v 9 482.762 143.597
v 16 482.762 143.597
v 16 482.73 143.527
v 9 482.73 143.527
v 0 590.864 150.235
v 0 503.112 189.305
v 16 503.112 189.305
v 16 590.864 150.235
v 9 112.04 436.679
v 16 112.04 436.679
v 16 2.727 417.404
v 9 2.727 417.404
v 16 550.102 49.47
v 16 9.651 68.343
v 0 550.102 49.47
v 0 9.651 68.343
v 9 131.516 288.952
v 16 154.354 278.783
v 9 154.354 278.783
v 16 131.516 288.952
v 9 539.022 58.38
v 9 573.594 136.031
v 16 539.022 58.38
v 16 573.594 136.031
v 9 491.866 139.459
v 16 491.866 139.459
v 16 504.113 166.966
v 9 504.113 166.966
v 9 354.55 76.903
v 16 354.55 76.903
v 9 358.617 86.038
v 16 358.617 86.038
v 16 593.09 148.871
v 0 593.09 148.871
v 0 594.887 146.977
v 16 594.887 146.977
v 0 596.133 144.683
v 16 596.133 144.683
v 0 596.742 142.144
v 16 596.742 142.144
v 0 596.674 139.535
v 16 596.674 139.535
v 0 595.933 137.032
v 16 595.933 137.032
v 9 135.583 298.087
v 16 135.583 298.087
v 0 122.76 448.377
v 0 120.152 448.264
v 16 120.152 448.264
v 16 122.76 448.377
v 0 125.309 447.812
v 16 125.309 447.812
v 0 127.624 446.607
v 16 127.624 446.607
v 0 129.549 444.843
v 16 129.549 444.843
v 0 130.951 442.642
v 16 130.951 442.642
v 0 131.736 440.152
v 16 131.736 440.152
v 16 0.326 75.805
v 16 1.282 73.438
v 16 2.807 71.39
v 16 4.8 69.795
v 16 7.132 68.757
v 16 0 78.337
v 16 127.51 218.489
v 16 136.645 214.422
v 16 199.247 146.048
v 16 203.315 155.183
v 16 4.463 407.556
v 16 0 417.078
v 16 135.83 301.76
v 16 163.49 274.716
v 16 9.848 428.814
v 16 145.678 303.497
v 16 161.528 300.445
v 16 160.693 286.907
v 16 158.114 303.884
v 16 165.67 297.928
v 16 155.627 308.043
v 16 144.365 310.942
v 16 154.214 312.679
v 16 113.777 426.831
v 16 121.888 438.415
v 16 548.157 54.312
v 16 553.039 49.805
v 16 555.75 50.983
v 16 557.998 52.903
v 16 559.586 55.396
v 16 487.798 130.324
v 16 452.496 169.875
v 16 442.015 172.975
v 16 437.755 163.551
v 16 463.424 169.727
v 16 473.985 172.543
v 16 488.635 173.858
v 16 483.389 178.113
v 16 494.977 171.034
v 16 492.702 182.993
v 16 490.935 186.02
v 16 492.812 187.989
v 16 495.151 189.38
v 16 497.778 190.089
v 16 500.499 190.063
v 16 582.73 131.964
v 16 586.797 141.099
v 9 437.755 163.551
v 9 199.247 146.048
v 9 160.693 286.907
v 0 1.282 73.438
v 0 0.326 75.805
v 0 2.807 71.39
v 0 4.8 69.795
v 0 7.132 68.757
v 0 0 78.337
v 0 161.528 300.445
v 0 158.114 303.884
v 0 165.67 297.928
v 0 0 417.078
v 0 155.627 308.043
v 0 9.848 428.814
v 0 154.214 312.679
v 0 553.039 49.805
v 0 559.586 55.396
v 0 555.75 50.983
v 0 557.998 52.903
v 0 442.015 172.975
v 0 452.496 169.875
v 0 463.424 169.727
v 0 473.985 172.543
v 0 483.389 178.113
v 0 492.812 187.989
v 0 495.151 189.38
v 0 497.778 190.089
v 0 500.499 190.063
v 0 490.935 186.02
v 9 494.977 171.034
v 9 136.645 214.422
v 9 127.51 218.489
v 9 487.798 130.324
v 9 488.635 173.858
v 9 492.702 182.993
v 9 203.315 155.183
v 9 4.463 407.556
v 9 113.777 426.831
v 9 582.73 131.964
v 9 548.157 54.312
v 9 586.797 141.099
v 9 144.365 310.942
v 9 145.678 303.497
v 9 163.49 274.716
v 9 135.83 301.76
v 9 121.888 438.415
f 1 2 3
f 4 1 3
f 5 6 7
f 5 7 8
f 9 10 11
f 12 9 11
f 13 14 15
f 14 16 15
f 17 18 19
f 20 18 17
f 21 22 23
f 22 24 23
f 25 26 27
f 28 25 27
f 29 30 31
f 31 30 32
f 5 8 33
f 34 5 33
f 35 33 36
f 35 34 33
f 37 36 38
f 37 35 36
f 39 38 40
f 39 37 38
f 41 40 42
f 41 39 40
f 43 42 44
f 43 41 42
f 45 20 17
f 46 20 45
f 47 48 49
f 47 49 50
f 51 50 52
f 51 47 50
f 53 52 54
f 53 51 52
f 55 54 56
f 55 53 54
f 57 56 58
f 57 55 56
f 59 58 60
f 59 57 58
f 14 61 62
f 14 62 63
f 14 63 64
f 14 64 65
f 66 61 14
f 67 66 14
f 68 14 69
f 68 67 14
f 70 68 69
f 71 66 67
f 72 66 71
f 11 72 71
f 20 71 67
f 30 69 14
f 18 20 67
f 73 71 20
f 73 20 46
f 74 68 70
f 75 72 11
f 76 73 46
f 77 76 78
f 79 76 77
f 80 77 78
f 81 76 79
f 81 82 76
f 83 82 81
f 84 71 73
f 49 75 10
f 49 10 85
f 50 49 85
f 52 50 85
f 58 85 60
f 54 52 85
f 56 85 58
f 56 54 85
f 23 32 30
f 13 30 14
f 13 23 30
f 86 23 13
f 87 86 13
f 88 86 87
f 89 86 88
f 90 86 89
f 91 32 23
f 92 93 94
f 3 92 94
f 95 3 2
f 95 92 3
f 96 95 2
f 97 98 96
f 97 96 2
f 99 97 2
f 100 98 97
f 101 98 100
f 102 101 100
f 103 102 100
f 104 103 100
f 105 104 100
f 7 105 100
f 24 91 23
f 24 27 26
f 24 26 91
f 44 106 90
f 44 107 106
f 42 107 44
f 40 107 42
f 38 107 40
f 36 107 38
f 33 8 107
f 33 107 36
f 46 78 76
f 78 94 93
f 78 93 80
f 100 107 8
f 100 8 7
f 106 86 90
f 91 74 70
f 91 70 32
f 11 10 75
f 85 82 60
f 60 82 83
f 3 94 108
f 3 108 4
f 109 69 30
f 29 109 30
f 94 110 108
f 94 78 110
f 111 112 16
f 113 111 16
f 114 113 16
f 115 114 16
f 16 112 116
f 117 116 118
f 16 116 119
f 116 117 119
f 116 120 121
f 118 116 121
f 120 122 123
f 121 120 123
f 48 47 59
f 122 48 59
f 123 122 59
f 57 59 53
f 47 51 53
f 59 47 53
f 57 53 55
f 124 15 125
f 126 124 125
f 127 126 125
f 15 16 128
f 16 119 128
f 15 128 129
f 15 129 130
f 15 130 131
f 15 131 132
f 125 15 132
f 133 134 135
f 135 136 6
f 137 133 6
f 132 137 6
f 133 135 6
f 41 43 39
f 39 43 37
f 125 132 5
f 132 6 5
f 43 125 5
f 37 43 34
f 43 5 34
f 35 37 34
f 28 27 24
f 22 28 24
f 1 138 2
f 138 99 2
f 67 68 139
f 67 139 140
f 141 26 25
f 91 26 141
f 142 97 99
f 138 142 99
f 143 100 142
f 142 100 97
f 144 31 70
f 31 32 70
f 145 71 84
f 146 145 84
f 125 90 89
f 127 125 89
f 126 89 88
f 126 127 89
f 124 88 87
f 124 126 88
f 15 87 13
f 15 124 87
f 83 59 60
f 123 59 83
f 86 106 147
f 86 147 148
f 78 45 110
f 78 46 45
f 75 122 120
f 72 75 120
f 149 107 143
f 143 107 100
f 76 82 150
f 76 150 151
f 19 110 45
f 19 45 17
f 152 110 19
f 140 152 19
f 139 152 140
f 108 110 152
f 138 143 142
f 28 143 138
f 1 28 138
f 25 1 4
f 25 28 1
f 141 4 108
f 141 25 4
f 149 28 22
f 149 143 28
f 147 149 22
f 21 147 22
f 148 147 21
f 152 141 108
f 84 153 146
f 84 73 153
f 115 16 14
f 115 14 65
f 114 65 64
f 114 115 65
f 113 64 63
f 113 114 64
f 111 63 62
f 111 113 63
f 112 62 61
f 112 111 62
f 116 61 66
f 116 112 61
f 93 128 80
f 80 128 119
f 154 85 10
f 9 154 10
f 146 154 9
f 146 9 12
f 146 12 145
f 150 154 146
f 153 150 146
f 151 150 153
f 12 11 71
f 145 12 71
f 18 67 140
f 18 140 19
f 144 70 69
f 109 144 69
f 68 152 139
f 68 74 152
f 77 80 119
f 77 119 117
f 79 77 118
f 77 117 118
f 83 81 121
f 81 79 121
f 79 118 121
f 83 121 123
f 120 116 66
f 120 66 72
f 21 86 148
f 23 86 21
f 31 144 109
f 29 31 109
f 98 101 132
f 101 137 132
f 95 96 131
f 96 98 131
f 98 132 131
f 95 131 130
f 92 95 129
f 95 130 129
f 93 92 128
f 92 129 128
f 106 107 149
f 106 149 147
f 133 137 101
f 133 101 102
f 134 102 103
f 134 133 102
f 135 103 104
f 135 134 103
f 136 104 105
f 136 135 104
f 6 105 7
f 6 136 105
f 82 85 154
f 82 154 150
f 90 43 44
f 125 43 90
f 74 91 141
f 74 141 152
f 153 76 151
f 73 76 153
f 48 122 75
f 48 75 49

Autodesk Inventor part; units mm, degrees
ref_plane "YZ Plane" through (0, 0, 0) normal (1, 0, 0) x (0, 1, 0)
ref_plane "XZ Plane" through (0, 0, 0) normal (0, 1, 0) x (-1, 0, 0)
ref_plane "XY Plane" through (0, 0, 0) normal (0, 0, 1) x (1, 0, 0)
sketch "Sketch1" plane through (0, 0, 0) normal (1, 0, 0) x (0, 1, 0)
  line L0 (0, 78.3368) -> (0, 427.0775)
  line L1 (9.8481, 428.814) -> (120.1519, 448.2635)
  line L2 (131.7365, 440.1519) -> (154.2135, 312.6787)
  line L3 (503.1119, 189.3047) -> (590.8645, 150.2346)
  line L4 (595.9326, 137.0318) -> (559.5861, 55.3964)
  line L5 (494.9423, 192.942) -> (494.9423, 192.942)
  line L6 (442.0149, 172.9748) -> (165.6696, 297.928)
  arc A0 (442.0149, 172.9748) -> (490.9347, 186.0198) centre (458.495, 209.4221) ccw
  arc A1 (154.2135, 312.6787) -> (165.6696, 297.928) centre (173.9096, 316.1516) ccw
  arc A2 (131.7365, 440.1519) -> (120.1519, 448.2635) centre (121.8884, 438.4154) ccw
  line L7 (9.8481, 428.814) -> (0, 417.0775)
  arc A3 (595.9326, 137.0318) -> (590.8645, 150.2346) centre (586.7972, 141.0991) ccw
  arc A4 (503.1119, 189.3047) -> (490.9347, 186.0198) centre (499.0446, 180.1692) ccw
  line L8 (9.651, 68.3429) -> (550.1017, 49.4699)
  arc A5 (550.1017, 49.4699) -> (559.5861, 55.3964) centre (550.4507, 59.4638) ccw
  arc A6 (0, 78.3368) -> (9.651, 68.3429) centre (10, 78.3368) ccw
  line L9 (0, 417.0775) -> (0, 78.3368)
  point P0 (534.922, 0)
  point P1 (130, 450)
  point P2 (156.0472, 302.2788)
  point P3 (600, 146.1672)
  point P4 (478.4622, 156.4947)
  point P5 (0, 427.0775)
  point P6 (0, 28.3368)
  dimension "d0" = 130
  dimension "d1" = 404.922
  dimension "d3" = 150
  dimension "d4" = 160
  dimension "d5" = 115
  dimension "d13" = 40
  dimension "d14" = 40
  dimension "d15" = 20
  dimension "d16" = 10
  dimension "d17" = 10
  dimension "d18" = 10
  dimension "d68" = 10
  dimension "d69" = 10
extrude "Extrusion1" add sketch "Sketch1" along normal blind 16
sketch "Sketch2" plane through (16, 0, 0) normal (1, 0, 0) x (0, 0, -1)
  line L0 (-172.9748, 442.0149) -> (-297.928, 165.6696) projected
  line L1 (-428.814, 9.8481) -> (-417.0775, 0) projected
  line L2 (-417.0775, 0) -> (-78.3368, 0) projected
  line L3 (-55.3964, 559.5861) -> (-137.0318, 595.9326) projected
  arc A0 (-137.0318, 595.9326) -> (-150.2346, 590.8645) centre (-141.0991, 586.7972) ccw projected
  line L4 (-150.2346, 590.8645) -> (-189.3047, 503.1119) projected
  arc A1 (-189.3047, 503.1119) -> (-186.0198, 490.9347) centre (-180.1692, 499.0446) ccw projected
  arc A2 (-172.9748, 442.0149) -> (-186.0198, 490.9347) centre (-209.4221, 458.495) ccw projected
  line L5 (-172.9748, 442.0149) -> (-297.928, 165.6696) projected
  arc A3 (-312.6787, 154.2135) -> (-297.928, 165.6696) centre (-316.1516, 173.9096) ccw projected
  line L6 (-312.6787, 154.2135) -> (-440.1519, 131.7365) projected
  arc A4 (-440.1519, 131.7365) -> (-448.2635, 120.1519) centre (-438.4154, 121.8884) ccw projected
  line L7 (-448.2635, 120.1519) -> (-428.814, 9.8481) projected
  line L8 (-438.4154, 121.8884) -> (-310.9422, 144.3654)
  line L9 (-286.9073, 160.6932) -> (-163.5511, 437.7551)
  line L10 (-163.5511, 437.7551) -> (-143.4328, 482.9414)
  line L11 (-143.4328, 482.9414) -> (-139.4594, 491.8657)
  line L12 (-139.4594, 491.8657) -> (-130.324, 487.7983)
  line L13 (-130.324, 487.7983) -> (-288.9516, 131.5158)
  line L14 (-288.9516, 131.5158) -> (-298.087, 135.5831)
  line L15 (-298.087, 135.5831) -> (-286.9073, 160.6932)
  line L16 (-428.814, 9.8481) -> (-417.0775, 0) projected
  line L17 (-143.5969, 482.7615) -> (-143.5268, 482.7303)
  line L18 (-438.4154, 121.8884) -> (-303.4968, 145.6782)
  line L19 (-303.4968, 145.6782) -> (-301.7603, 135.8301)
  line L20 (-301.7603, 135.8301) -> (-436.679, 112.0403)
  line L21 (-438.4154, 121.8884) -> (-436.679, 112.0403)
  line L22 (-436.679, 112.0403) -> (-417.404, 2.7267)
  line L23 (-436.679, 112.0403) -> (-325.679, 112.0403) construction
  line L24 (-417.404, 2.7267) -> (-407.5559, 4.4631)
  line L25 (-407.5559, 4.4631) -> (-426.8309, 113.7768)
  line L26 (-141.0991, 586.7972) -> (-182.9931, 492.702)
  line L27 (-182.9931, 492.702) -> (-173.8576, 488.6347)
  line L28 (-173.8576, 488.6347) -> (-131.9637, 582.7298)
  line L29 (-139.4594, 491.8657) -> (-166.9664, 504.1126)
  line L30 (-139.4594, 491.8657) -> (-109.3492, 491.8657) construction
  line L31 (-166.9664, 504.1126) -> (-171.0338, 494.9772)
  line L32 (-171.0338, 494.9772) -> (-143.5268, 482.7303)
  line L33 (-141.0991, 586.7972) -> (-131.9637, 582.7298)
  line L34 (-131.9637, 582.7298) -> (3.0363, 582.7298) construction
  line L35 (-12.7024, 518.6849) -> (487.2976, 518.6849) construction
  line L36 (-288.9516, 131.5158) -> (-274.7158, 163.4898)
  line L37 (-274.7158, 163.4898) -> (-214.4218, 136.6452)
  line L38 (-214.4218, 136.6452) -> (-218.4892, 127.5097)
  line L39 (-218.4892, 127.5097) -> (-278.7831, 154.3544)
  line L40 (-68.3429, 9.651) -> (-49.4699, 550.1017) projected
  arc A5 (-49.4699, 550.1017) -> (-55.3964, 559.5861) centre (-59.4638, 550.4507) ccw projected
  arc A6 (-78.3368, 0) -> (-68.3429, 9.651) centre (-78.3368, 10) ccw projected
  line L41 (-131.9637, 582.7298) -> (-54.3123, 548.1572)
  line L42 (-131.9637, 582.7298) -> (-46.9637, 582.7298) construction
  line L43 (-54.3123, 548.1572) -> (-58.3797, 539.0217)
  line L44 (-136.0311, 573.5943) -> (-58.3797, 539.0217)
  line L45 (-170.9977, 396.4438) -> (-86.038, 358.6172)
  line L46 (-86.038, 358.6172) -> (-155.1834, 203.3146)
  line L47 (-155.1834, 203.3146) -> (-146.0479, 199.2472)
  line L48 (-146.0479, 199.2472) -> (-76.9026, 354.5499)
  line L49 (-76.9026, 354.5499) -> (-86.038, 358.6172)
  point P0 (0, 0)
  dimension "d25" = 10
  dimension "d26" = 390
  dimension "d27" = 10
  dimension "d37" = 137
  dimension "d38" = 111
  dimension "d39" = 80
  dimension "d40" = 10
  dimension "d41" = 90
  dimension "d42" = 90
  dimension "d43" = 103
  dimension "d44" = 10
  dimension "d45" = 90
  dimension "d46" = 156
  dimension "d60" = 35
  dimension "d61" = 66
  dimension "d62" = 90
  dimension "d63" = 10
  dimension "d64" = 90
  dimension "d65" = 90
  dimension "d70" = 85
  dimension "d71" = 24
  dimension "d72" = 93
  dimension "d73" = 100
  dimension "d74" = 170
  dimension "d75" = 10
extrude "Extrusion2" cut sketch "Sketch2" against normal blind 7 contours L8 L18 L19 L20 L21 | L20 L25 L24 L22 | L49 L48 L47 L46 | L9 L10 L11 L12 L13 L14 L15 | L17 L32 L28 L29 L11 L10 | L13 L37 L38 L39 | L28 L27 L26 L33 | L28 L41 L43 L44
equation "\"d18\" = d17"
properties part number "Arcade_Left"
